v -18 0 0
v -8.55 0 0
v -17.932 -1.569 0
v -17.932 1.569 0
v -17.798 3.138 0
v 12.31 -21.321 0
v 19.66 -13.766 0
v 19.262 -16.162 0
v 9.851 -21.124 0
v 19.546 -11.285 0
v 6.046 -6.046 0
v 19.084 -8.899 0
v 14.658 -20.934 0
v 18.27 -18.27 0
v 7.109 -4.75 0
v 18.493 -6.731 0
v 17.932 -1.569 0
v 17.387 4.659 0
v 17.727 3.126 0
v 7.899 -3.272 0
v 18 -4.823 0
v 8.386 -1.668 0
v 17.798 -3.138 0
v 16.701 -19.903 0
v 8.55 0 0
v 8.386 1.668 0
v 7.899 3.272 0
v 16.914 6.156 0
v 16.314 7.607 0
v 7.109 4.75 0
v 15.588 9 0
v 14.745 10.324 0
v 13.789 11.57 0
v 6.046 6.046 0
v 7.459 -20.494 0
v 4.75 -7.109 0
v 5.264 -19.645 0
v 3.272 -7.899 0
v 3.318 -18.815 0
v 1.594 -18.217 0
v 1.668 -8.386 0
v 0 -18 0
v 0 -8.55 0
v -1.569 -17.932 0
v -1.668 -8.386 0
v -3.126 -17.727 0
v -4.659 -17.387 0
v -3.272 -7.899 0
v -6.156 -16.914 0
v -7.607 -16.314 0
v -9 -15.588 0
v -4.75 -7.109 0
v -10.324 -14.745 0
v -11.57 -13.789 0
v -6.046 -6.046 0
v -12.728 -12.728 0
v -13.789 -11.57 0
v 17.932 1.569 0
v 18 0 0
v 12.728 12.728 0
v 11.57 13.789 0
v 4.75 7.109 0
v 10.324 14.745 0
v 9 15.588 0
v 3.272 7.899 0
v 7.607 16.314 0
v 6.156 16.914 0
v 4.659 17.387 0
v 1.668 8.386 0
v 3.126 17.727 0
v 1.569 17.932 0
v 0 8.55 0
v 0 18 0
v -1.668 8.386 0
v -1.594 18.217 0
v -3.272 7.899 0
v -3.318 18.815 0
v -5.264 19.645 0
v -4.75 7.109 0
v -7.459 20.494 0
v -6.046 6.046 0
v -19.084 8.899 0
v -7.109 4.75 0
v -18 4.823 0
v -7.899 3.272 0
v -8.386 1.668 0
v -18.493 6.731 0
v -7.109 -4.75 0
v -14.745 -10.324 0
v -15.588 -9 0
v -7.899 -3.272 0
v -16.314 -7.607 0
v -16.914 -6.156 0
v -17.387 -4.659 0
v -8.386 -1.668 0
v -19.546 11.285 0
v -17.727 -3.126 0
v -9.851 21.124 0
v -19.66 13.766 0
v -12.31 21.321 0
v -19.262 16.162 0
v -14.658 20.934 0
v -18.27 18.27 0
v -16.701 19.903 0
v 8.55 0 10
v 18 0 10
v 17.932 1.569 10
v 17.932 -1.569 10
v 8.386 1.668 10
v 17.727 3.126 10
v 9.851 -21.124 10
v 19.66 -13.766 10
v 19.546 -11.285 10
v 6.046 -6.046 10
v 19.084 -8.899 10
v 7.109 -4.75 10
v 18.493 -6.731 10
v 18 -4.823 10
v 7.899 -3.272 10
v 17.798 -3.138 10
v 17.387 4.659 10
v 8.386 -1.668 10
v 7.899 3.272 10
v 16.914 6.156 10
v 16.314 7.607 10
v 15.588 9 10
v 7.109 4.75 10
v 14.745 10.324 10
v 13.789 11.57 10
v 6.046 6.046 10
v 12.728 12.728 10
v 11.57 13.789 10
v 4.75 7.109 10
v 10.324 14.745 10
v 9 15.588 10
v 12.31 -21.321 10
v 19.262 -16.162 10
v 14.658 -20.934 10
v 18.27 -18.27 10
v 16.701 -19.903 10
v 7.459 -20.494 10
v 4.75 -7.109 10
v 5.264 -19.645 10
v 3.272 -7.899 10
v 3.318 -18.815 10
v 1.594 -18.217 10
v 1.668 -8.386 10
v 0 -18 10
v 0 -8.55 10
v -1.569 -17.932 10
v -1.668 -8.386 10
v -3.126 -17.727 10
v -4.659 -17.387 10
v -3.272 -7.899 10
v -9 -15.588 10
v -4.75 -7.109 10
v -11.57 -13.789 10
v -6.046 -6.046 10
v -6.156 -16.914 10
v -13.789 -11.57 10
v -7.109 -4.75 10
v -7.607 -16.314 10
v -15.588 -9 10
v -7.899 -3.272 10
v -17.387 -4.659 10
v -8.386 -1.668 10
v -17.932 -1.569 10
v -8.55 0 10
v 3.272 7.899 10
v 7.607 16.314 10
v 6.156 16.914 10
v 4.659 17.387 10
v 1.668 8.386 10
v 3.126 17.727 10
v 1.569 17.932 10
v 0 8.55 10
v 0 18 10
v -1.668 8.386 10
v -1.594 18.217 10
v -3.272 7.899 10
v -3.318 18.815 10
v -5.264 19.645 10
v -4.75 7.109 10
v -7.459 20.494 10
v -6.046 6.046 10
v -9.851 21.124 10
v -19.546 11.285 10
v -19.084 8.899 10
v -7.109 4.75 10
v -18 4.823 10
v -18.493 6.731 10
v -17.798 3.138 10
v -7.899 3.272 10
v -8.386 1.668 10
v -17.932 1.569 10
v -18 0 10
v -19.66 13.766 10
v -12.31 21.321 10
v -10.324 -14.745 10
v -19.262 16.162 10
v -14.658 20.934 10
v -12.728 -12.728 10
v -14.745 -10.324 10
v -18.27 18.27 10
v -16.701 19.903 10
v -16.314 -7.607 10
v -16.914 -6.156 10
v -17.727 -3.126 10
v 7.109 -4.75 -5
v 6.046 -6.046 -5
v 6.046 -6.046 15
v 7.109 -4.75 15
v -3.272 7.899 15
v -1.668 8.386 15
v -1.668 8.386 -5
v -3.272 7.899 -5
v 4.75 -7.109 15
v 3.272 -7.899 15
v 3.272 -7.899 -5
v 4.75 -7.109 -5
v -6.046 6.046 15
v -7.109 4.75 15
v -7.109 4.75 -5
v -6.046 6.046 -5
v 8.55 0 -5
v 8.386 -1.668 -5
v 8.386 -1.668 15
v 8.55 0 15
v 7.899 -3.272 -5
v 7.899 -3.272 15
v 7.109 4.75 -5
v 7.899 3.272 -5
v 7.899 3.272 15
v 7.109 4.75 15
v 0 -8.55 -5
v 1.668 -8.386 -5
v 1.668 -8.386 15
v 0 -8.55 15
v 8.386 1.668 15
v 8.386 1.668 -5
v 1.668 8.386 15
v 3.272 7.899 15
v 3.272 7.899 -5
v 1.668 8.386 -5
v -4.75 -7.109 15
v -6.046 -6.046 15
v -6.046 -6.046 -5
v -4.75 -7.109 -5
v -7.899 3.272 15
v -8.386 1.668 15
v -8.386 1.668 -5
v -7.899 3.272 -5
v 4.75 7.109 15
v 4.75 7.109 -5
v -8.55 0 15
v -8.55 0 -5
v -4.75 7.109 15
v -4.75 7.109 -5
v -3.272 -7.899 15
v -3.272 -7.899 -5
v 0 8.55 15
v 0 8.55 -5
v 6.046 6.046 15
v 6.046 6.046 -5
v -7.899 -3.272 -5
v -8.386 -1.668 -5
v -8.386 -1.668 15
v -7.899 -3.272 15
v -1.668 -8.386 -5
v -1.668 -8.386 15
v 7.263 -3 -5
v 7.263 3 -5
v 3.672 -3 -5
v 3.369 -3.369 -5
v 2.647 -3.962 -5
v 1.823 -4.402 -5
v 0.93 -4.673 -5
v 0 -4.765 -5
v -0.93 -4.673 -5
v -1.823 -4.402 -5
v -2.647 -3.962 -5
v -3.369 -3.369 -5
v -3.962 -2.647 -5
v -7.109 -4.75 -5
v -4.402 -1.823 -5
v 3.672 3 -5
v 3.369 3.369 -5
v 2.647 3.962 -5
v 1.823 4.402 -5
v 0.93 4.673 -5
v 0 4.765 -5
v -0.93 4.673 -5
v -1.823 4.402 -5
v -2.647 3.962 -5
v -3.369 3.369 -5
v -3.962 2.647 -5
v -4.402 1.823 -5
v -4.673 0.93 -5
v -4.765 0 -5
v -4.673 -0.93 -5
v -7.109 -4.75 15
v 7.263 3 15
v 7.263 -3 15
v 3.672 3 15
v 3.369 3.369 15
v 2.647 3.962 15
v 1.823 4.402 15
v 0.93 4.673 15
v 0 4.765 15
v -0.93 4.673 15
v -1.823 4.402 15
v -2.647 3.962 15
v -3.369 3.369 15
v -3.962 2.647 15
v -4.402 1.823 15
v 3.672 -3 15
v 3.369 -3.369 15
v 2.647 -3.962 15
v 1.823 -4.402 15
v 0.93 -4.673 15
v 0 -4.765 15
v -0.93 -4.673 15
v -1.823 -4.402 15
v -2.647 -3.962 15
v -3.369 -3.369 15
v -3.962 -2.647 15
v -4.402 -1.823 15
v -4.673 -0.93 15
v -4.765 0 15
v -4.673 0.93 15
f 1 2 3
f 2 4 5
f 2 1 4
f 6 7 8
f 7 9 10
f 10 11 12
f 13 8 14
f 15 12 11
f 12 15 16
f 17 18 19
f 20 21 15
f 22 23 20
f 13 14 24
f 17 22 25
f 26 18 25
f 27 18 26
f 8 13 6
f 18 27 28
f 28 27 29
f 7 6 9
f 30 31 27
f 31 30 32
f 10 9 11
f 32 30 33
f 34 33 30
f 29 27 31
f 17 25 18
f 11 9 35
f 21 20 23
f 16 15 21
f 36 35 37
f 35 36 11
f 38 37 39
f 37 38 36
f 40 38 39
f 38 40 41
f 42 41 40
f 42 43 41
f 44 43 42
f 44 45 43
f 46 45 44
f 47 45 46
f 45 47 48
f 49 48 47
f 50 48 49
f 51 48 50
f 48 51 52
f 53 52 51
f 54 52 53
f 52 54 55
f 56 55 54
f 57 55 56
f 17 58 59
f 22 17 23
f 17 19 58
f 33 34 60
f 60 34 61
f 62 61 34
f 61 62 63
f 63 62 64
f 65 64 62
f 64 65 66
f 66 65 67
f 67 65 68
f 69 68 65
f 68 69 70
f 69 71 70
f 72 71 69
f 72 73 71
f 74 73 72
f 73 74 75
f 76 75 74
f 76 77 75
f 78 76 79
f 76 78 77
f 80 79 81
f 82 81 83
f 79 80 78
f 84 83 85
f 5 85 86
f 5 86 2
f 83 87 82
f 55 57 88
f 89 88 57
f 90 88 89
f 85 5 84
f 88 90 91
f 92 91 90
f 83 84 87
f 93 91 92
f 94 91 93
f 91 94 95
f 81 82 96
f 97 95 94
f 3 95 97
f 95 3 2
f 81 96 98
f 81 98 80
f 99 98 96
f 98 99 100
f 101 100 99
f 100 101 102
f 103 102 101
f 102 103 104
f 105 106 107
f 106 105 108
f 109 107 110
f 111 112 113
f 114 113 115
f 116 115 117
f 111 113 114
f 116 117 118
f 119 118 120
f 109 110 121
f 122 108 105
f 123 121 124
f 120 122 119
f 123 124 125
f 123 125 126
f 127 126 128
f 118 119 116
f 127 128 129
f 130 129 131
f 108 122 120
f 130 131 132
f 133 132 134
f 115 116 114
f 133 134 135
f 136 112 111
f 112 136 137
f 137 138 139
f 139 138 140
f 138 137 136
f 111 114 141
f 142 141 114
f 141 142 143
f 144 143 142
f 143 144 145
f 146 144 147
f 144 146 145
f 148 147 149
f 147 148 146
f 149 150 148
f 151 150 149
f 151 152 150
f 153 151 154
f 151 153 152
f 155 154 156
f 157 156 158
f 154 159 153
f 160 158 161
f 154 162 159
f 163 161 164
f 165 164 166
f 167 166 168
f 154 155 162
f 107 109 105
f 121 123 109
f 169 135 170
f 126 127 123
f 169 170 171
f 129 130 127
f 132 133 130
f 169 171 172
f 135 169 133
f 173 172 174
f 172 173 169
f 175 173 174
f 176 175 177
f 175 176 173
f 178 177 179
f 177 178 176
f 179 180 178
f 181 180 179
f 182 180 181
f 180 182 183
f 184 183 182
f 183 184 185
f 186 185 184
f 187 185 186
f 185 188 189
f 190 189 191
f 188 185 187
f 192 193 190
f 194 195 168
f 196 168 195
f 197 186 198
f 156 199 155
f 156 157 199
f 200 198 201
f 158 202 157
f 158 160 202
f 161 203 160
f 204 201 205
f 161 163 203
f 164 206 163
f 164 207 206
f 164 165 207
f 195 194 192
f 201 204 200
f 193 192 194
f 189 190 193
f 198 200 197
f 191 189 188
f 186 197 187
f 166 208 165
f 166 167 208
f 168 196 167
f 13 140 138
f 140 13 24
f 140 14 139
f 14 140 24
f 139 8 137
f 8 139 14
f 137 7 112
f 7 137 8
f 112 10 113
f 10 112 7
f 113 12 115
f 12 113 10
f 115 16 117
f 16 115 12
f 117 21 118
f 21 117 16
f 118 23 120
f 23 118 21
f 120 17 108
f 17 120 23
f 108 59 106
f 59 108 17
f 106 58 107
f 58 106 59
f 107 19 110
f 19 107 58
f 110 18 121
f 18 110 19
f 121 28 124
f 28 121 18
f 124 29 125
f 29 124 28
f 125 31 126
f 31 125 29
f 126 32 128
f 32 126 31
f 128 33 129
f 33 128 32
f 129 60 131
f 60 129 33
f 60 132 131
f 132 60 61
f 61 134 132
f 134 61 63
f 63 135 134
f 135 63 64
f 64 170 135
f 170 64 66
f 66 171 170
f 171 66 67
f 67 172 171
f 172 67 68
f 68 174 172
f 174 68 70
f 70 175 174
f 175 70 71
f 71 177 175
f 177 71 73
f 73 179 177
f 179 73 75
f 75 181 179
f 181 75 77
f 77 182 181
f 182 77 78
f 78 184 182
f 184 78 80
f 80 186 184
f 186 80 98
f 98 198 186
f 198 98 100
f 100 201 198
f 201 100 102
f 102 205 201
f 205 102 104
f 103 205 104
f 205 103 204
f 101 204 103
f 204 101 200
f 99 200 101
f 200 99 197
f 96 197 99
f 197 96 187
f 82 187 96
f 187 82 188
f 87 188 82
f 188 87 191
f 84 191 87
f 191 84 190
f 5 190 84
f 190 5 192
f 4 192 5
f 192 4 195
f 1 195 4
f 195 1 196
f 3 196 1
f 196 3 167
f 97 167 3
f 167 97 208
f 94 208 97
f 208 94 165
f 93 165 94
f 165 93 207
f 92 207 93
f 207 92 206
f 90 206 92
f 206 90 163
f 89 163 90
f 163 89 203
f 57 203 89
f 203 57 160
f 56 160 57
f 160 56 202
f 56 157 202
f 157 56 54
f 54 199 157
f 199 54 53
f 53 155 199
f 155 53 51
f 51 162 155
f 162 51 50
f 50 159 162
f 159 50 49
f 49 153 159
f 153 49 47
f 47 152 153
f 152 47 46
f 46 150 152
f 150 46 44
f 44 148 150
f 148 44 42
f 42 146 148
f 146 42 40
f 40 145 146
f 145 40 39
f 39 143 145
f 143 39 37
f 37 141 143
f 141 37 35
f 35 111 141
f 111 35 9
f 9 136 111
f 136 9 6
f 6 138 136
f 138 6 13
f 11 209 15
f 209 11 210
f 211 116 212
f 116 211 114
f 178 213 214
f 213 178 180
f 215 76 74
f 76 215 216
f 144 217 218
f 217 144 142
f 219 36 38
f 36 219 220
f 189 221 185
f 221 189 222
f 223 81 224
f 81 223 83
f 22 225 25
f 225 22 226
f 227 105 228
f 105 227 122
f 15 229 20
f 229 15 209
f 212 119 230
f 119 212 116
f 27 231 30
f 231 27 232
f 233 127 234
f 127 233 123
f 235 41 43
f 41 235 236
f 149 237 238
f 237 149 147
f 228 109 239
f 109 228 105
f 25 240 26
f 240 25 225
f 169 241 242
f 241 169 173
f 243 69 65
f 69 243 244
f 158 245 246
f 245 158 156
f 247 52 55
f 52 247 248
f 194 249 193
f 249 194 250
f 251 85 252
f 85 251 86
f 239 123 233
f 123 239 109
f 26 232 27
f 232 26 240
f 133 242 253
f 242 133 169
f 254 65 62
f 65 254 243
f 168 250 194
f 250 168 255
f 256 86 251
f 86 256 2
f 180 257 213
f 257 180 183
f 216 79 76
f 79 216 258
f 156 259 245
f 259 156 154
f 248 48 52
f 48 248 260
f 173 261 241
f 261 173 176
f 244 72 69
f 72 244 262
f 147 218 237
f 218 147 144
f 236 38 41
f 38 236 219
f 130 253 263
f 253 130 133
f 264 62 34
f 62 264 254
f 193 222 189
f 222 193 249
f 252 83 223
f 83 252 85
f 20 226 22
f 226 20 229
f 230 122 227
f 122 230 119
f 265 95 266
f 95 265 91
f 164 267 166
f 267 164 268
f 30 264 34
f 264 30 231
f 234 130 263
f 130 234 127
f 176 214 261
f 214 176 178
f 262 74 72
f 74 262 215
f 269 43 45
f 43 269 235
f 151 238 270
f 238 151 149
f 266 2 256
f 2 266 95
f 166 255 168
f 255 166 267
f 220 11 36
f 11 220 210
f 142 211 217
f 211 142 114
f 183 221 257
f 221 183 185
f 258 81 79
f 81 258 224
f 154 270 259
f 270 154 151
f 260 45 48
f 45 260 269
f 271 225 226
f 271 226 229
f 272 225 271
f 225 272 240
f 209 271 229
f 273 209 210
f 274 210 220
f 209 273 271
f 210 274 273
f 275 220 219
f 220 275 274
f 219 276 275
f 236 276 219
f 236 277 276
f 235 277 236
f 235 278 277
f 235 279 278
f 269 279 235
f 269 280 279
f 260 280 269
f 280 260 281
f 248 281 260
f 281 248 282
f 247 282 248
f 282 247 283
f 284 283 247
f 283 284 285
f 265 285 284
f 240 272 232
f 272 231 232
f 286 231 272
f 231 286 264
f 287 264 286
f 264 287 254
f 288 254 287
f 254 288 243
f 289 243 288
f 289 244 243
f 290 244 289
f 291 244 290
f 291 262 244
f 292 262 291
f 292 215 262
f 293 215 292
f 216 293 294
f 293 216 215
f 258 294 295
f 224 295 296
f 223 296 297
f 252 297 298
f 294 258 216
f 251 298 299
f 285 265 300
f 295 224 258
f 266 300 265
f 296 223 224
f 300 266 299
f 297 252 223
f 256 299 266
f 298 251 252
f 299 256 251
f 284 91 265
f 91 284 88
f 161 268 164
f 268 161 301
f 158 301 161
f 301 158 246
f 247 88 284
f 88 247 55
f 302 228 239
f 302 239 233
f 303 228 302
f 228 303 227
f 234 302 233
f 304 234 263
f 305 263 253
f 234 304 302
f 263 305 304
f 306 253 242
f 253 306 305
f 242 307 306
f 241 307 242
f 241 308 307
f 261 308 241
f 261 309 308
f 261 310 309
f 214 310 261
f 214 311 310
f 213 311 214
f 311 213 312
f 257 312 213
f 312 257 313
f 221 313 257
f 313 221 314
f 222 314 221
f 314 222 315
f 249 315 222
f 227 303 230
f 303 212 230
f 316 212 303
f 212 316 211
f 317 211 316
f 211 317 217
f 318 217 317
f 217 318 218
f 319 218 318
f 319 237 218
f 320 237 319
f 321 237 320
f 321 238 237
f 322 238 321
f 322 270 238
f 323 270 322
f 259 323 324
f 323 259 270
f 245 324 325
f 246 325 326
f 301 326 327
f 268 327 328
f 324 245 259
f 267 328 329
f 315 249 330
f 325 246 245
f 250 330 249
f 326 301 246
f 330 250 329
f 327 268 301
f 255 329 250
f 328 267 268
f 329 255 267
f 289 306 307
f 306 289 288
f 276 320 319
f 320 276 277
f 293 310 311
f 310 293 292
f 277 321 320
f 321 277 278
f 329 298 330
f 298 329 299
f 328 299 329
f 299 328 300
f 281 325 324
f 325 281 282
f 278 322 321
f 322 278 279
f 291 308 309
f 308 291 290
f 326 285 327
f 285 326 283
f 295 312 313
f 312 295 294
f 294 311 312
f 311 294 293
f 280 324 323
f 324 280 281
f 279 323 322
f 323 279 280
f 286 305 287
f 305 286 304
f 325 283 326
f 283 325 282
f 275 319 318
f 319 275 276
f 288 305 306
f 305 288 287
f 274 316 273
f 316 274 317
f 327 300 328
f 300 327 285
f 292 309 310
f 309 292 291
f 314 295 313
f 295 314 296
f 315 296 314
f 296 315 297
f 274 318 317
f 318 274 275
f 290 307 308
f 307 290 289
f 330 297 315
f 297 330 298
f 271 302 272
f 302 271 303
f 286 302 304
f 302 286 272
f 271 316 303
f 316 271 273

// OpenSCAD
$fn = 32;

// ----------------------------------------------------------------------
// Cam: base radius 18 mm with a 8 mm lift over 150 degrees
// ----------------------------------------------------------------------

// --- parameters (mm) ---
base_r = 18;              // base radius
lift = 8;                 // lift height above the base radius
lift_span = 150;          // angular width of the lift
lift_start = 90;          // angle where the lift starts
cam_t = 10;               // cam plate thickness
hub_d = 17.1;             // hub diameter
hub_h = 20;               // hub height
bore_d = 9.53;            // bore
key_w = 6;                // keyway width
key_depth = 1.79;         // keyway depth

cam_profile = [[18, 0], [17.932, 1.569], [17.727, 3.126], [17.387, 4.659], [16.914, 6.156], [16.314, 7.607], [15.588, 9], [14.745, 10.324], [13.789, 11.57], [12.728, 12.728], [11.57, 13.789], [10.324, 14.745], [9, 15.588], [7.607, 16.314], [6.156, 16.914], [4.659, 17.387], [3.126, 17.727], [1.569, 17.932], [0, 18], [-1.594, 18.217], [-3.318, 18.815], [-5.264, 19.645], [-7.459, 20.494], [-9.851, 21.124], [-12.31, 21.321], [-14.658, 20.934], [-16.701, 19.903], [-18.27, 18.27], [-19.262, 16.162], [-19.66, 13.766], [-19.546, 11.285], [-19.084, 8.899], [-18.493, 6.731], [-18, 4.823], [-17.798, 3.138], [-17.932, 1.569], [-18, 0], [-17.932, -1.569], [-17.727, -3.126], [-17.387, -4.659], [-16.914, -6.156], [-16.314, -7.607], [-15.588, -9], [-14.745, -10.324], [-13.789, -11.57], [-12.728, -12.728], [-11.57, -13.789], [-10.324, -14.745], [-9, -15.588], [-7.607, -16.314], [-6.156, -16.914], [-4.659, -17.387], [-3.126, -17.727], [-1.569, -17.932], [0, -18], [1.594, -18.217], [3.318, -18.815], [5.264, -19.645], [7.459, -20.494], [9.851, -21.124], [12.31, -21.321], [14.658, -20.934], [16.701, -19.903], [18.27, -18.27], [19.262, -16.162], [19.66, -13.766], [19.546, -11.285], [19.084, -8.899], [18.493, -6.731], [18, -4.823], [17.798, -3.138], [17.932, -1.569]];

difference() {
  union() {
    linear_extrude(height = cam_t) polygon(cam_profile);
    /* hub, proud of the cam plate on both sides */
    translate([0, 0, -5]) cylinder(h = hub_h, d = hub_d);
  }
  /* bore through the hub, 2.5 mm clear on both faces */
  translate([0, 0, -7.5]) cylinder(h = hub_h + 5, d = bore_d);
  /* keyway, milled through the whole hub */
  translate([2.973, -3, -7.5]) cube([4.29, 6, 25]);
}
